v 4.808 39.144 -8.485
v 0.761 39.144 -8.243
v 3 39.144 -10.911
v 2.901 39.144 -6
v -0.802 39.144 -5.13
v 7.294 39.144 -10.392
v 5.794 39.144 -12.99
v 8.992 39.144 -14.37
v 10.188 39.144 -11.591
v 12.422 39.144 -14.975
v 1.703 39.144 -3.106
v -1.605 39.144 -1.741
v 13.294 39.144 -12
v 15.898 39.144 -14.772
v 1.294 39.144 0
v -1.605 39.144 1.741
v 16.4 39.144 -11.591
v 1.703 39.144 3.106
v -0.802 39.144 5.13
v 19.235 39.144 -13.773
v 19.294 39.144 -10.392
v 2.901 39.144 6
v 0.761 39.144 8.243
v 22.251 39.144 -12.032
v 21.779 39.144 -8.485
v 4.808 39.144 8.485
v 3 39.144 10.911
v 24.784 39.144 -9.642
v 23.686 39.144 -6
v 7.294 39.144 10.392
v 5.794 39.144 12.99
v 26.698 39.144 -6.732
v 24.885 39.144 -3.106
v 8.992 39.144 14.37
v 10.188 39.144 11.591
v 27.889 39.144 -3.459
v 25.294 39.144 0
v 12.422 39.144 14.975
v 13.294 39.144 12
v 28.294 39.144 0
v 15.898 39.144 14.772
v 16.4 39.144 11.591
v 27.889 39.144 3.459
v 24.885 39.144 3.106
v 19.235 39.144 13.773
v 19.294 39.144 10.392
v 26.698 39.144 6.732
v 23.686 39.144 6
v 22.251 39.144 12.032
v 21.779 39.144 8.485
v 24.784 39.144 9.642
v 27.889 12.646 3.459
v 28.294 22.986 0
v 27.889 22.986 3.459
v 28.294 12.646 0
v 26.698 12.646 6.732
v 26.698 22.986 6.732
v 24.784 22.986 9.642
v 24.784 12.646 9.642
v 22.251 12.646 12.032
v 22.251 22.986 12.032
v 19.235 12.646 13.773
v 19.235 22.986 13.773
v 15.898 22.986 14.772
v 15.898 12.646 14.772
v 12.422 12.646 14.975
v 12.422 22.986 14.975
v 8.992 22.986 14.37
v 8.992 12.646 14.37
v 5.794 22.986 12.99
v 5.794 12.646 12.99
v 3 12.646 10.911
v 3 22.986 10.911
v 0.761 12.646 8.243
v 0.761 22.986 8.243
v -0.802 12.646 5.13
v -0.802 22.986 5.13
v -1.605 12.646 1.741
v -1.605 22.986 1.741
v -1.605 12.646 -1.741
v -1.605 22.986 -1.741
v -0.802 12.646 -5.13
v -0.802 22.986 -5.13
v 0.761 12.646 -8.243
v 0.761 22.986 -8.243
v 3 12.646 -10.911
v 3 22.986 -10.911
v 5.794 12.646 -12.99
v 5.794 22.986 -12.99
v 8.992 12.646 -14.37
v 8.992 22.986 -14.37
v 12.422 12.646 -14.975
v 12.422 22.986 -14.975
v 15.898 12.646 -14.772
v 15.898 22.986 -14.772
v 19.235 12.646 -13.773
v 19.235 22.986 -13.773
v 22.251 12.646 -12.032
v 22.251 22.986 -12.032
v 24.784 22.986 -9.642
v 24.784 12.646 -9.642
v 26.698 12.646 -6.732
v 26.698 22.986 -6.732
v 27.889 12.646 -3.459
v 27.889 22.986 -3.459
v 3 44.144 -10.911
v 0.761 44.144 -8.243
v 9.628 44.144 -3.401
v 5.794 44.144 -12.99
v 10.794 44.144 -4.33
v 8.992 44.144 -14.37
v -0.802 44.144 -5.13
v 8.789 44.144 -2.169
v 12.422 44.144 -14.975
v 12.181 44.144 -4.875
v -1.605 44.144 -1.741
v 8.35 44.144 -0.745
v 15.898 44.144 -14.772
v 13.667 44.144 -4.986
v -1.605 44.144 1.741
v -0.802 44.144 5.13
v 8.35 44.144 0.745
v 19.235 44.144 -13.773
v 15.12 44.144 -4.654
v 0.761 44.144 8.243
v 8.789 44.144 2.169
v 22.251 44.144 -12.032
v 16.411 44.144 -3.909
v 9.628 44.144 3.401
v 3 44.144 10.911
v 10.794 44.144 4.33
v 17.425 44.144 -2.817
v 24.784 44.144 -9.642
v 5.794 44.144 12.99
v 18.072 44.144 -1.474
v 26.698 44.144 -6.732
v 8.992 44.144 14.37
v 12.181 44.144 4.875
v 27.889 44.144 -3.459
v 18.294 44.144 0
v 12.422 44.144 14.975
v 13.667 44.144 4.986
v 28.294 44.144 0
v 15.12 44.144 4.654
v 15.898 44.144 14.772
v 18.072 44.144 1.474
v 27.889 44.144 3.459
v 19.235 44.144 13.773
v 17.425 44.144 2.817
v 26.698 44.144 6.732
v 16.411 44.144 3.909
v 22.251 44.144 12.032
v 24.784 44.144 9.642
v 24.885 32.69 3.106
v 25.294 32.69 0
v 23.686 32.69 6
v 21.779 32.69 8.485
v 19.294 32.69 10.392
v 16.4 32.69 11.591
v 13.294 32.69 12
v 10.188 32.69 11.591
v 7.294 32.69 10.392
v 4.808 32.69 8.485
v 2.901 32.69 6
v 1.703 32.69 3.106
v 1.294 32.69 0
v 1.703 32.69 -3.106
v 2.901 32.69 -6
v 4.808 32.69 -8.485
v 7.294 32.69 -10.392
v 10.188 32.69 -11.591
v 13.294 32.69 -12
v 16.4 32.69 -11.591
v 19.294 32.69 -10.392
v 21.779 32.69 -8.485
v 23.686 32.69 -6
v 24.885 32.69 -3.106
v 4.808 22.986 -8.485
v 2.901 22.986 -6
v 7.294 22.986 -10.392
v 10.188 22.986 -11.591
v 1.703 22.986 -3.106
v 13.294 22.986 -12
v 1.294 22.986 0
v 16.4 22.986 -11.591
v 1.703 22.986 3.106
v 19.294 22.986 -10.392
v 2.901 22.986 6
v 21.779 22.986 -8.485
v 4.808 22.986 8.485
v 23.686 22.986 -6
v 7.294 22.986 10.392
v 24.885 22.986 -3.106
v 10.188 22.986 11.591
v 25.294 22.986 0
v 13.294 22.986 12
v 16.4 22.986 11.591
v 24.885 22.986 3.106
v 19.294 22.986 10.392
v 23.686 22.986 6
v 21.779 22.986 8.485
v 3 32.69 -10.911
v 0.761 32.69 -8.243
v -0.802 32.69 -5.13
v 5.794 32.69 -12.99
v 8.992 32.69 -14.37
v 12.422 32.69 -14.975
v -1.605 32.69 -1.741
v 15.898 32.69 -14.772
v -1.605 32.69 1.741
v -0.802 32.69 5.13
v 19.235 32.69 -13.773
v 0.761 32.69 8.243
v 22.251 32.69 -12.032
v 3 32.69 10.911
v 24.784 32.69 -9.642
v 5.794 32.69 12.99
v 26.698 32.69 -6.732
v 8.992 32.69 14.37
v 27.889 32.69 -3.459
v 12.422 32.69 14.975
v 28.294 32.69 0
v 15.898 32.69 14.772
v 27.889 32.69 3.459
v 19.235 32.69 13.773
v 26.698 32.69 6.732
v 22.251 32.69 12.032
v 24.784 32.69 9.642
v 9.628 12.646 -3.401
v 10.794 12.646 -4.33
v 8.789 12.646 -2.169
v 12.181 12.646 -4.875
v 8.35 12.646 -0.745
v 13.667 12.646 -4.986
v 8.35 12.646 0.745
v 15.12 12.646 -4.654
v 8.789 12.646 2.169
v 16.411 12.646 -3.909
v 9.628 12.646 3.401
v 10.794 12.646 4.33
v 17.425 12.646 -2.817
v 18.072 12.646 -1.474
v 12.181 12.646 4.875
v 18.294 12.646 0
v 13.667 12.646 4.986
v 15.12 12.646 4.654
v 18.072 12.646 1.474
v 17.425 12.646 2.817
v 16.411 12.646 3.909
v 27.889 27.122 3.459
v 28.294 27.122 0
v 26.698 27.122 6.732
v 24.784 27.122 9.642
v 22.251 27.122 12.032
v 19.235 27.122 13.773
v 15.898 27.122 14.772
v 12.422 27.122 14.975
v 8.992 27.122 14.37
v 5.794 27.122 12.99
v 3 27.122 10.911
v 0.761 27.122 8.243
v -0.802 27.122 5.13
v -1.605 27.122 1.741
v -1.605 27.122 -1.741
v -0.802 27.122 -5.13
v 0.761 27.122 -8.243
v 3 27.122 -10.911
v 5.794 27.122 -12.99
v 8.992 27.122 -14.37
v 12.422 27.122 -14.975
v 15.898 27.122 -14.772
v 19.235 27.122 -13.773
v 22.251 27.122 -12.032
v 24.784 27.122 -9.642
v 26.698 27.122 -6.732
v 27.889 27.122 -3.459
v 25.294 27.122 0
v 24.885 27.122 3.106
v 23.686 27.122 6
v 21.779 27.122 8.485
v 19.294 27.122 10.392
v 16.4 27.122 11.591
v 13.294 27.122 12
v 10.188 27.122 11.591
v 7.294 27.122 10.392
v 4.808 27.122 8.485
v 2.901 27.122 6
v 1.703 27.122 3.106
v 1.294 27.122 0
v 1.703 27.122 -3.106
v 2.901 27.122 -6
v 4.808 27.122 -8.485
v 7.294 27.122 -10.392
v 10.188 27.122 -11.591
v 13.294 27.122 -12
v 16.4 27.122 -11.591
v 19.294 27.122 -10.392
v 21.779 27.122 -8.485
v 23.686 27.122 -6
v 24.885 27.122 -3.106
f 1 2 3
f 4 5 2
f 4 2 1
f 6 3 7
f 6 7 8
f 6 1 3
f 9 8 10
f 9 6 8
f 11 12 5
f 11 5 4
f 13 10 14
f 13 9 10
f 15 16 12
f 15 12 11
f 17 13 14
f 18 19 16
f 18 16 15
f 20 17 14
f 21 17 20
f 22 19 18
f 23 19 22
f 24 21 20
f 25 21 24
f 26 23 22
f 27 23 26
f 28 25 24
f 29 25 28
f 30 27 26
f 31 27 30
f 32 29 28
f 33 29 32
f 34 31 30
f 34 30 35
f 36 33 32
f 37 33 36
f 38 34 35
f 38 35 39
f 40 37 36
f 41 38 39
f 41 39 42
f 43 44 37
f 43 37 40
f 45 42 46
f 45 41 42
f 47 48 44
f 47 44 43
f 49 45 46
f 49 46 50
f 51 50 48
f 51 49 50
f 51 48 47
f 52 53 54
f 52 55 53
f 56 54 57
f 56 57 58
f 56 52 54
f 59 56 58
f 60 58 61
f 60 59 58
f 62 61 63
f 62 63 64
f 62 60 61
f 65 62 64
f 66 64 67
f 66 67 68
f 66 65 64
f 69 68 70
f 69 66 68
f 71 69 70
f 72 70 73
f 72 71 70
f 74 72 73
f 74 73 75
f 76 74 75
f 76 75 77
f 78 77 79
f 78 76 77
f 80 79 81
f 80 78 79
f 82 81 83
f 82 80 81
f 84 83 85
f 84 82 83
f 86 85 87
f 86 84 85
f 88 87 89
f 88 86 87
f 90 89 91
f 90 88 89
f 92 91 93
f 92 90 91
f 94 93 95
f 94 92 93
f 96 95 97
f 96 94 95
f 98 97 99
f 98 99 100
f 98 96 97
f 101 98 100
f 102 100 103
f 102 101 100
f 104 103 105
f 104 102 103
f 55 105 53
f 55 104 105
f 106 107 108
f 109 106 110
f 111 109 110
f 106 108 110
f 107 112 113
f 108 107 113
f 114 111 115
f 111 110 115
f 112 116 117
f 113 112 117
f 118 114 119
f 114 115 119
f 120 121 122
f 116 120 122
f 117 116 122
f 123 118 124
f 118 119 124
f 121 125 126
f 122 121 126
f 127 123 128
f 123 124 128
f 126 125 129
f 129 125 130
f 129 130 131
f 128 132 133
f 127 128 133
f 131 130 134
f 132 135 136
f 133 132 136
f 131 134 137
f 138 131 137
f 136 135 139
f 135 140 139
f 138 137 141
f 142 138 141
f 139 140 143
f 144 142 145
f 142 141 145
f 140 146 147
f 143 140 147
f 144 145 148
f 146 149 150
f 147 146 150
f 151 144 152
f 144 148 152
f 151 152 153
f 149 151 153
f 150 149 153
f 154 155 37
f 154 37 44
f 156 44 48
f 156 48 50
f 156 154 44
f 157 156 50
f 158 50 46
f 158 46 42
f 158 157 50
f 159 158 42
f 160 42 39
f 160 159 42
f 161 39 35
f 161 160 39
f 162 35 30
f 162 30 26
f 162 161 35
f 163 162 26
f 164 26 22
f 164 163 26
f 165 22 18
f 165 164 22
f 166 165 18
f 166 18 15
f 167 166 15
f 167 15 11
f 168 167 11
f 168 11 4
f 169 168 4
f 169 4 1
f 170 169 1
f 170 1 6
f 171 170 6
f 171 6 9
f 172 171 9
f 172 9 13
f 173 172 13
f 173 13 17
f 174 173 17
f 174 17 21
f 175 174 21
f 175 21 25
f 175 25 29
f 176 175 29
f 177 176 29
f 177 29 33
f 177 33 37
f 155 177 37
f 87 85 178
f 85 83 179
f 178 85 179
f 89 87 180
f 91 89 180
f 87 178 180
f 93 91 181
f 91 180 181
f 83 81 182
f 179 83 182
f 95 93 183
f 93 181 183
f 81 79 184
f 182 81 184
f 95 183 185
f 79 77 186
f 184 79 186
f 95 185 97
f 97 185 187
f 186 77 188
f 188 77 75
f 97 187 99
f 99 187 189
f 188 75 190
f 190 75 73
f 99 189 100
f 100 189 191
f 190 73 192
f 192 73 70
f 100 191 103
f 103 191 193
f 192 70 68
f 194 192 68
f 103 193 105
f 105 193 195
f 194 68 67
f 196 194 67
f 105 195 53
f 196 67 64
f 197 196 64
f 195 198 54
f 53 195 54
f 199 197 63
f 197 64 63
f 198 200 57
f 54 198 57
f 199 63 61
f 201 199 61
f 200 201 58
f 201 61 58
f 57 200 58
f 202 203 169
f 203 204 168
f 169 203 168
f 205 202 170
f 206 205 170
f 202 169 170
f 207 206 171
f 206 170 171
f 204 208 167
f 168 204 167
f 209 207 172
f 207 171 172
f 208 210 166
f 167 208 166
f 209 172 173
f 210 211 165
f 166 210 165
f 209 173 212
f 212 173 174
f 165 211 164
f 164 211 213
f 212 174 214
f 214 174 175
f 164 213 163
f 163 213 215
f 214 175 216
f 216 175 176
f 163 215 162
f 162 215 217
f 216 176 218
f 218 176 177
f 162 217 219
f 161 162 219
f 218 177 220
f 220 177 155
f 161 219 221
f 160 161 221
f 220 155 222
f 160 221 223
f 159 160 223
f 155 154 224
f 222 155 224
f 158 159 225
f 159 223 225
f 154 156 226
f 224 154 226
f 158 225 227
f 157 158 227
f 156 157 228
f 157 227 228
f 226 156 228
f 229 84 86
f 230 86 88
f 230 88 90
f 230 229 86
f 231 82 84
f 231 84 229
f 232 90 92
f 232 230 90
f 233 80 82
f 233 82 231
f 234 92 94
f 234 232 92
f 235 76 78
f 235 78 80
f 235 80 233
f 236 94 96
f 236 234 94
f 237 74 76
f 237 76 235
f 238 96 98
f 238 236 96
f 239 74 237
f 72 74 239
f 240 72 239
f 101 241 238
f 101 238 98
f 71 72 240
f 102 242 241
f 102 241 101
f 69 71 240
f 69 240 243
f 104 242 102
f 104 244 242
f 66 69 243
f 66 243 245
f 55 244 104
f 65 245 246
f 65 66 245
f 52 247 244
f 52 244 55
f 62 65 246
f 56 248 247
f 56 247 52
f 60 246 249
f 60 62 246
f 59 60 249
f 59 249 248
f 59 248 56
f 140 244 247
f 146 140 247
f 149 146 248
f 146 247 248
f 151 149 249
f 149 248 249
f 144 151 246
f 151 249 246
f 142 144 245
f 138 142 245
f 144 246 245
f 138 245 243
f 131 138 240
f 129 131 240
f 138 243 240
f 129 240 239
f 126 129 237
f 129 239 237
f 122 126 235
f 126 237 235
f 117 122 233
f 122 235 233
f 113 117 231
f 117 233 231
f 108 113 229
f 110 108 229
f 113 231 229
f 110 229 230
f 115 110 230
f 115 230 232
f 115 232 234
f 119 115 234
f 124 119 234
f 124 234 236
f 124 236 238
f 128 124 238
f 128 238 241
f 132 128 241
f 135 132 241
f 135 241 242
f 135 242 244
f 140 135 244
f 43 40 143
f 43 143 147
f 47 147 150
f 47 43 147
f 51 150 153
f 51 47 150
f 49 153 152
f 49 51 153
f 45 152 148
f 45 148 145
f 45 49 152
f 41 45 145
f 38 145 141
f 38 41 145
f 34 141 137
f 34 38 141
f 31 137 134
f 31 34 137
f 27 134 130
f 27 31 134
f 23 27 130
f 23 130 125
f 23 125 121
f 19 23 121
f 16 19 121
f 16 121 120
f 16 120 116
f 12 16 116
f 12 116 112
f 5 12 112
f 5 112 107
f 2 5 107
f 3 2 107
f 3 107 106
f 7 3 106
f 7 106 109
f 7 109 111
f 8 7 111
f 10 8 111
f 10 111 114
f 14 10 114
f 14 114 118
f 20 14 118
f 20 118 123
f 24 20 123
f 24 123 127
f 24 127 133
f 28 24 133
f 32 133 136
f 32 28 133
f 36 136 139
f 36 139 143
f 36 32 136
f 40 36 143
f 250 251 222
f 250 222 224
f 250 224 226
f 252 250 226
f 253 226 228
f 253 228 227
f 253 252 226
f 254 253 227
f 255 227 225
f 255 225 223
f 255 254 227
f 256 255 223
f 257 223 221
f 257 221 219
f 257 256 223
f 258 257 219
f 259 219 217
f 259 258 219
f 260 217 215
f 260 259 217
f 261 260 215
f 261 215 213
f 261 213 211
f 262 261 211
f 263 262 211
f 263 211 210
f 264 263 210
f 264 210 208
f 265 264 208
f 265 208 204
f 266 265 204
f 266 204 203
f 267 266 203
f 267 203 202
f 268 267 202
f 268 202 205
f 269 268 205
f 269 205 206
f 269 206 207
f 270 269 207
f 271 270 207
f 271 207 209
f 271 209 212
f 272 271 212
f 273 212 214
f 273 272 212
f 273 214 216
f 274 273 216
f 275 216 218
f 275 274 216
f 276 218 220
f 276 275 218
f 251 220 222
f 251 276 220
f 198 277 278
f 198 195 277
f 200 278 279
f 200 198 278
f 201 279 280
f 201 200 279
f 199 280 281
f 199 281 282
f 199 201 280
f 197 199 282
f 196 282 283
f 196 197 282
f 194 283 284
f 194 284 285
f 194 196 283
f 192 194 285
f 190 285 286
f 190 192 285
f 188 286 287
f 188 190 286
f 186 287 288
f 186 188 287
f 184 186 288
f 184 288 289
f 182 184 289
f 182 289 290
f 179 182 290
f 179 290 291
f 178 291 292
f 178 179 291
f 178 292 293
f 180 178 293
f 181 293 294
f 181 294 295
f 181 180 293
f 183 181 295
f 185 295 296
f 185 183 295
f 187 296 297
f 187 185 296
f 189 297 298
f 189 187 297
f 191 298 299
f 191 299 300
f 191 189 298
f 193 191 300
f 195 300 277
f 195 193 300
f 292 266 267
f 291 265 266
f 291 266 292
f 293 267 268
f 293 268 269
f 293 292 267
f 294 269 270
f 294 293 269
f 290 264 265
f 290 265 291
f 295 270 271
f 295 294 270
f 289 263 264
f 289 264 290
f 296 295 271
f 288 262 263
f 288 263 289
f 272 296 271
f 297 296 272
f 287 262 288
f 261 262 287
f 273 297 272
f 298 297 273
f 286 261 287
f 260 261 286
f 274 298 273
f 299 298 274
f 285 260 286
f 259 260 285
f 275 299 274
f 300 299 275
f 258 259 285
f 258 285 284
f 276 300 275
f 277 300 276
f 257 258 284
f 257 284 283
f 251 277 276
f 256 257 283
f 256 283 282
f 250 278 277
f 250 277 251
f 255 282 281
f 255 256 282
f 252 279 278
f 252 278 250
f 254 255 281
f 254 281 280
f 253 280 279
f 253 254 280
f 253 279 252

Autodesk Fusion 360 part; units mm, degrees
sketch "Sketch1" plane through (0, 0, 0) normal (0, 0, 1) x (1, 0, 0)
  line L0 (18.2937, 44.1436) -> (28.2937, 44.1436)
  line L1 (28.2937, 44.1436) -> (28.2937, 39.1436)
  line L2 (28.2937, 39.1436) -> (25.2937, 39.1436)
  line L3 (25.2937, 39.1436) -> (25.2937, 32.6901)
  line L4 (25.2937, 32.6901) -> (28.2937, 32.6901)
  line L5 (28.2937, 32.6901) -> (28.2937, 27.1224)
  line L6 (28.2937, 27.1224) -> (25.2937, 27.1224)
  line L7 (25.2937, 27.1224) -> (25.2937, 22.9865)
  line L8 (25.2937, 22.9865) -> (28.2937, 22.9865)
  line L9 (28.2937, 22.9865) -> (28.2937, 12.6465)
  line L10 (18.2937, 44.1436) -> (18.2937, 12.6465)
  line L11 (28.2937, 12.6465) -> (18.2937, 12.6465)
  line L12 (13.2937, 44.1436) -> (13.2937, 53)
  dimension "d1" = 10
  dimension "d2" = 5
  dimension "d3" = 3
  dimension "d4" = 5
revolve "Revolve2" add sketch "Sketch1" angle 360 about axis through (13.2937, 53, 0) along (0, -1, 0)
